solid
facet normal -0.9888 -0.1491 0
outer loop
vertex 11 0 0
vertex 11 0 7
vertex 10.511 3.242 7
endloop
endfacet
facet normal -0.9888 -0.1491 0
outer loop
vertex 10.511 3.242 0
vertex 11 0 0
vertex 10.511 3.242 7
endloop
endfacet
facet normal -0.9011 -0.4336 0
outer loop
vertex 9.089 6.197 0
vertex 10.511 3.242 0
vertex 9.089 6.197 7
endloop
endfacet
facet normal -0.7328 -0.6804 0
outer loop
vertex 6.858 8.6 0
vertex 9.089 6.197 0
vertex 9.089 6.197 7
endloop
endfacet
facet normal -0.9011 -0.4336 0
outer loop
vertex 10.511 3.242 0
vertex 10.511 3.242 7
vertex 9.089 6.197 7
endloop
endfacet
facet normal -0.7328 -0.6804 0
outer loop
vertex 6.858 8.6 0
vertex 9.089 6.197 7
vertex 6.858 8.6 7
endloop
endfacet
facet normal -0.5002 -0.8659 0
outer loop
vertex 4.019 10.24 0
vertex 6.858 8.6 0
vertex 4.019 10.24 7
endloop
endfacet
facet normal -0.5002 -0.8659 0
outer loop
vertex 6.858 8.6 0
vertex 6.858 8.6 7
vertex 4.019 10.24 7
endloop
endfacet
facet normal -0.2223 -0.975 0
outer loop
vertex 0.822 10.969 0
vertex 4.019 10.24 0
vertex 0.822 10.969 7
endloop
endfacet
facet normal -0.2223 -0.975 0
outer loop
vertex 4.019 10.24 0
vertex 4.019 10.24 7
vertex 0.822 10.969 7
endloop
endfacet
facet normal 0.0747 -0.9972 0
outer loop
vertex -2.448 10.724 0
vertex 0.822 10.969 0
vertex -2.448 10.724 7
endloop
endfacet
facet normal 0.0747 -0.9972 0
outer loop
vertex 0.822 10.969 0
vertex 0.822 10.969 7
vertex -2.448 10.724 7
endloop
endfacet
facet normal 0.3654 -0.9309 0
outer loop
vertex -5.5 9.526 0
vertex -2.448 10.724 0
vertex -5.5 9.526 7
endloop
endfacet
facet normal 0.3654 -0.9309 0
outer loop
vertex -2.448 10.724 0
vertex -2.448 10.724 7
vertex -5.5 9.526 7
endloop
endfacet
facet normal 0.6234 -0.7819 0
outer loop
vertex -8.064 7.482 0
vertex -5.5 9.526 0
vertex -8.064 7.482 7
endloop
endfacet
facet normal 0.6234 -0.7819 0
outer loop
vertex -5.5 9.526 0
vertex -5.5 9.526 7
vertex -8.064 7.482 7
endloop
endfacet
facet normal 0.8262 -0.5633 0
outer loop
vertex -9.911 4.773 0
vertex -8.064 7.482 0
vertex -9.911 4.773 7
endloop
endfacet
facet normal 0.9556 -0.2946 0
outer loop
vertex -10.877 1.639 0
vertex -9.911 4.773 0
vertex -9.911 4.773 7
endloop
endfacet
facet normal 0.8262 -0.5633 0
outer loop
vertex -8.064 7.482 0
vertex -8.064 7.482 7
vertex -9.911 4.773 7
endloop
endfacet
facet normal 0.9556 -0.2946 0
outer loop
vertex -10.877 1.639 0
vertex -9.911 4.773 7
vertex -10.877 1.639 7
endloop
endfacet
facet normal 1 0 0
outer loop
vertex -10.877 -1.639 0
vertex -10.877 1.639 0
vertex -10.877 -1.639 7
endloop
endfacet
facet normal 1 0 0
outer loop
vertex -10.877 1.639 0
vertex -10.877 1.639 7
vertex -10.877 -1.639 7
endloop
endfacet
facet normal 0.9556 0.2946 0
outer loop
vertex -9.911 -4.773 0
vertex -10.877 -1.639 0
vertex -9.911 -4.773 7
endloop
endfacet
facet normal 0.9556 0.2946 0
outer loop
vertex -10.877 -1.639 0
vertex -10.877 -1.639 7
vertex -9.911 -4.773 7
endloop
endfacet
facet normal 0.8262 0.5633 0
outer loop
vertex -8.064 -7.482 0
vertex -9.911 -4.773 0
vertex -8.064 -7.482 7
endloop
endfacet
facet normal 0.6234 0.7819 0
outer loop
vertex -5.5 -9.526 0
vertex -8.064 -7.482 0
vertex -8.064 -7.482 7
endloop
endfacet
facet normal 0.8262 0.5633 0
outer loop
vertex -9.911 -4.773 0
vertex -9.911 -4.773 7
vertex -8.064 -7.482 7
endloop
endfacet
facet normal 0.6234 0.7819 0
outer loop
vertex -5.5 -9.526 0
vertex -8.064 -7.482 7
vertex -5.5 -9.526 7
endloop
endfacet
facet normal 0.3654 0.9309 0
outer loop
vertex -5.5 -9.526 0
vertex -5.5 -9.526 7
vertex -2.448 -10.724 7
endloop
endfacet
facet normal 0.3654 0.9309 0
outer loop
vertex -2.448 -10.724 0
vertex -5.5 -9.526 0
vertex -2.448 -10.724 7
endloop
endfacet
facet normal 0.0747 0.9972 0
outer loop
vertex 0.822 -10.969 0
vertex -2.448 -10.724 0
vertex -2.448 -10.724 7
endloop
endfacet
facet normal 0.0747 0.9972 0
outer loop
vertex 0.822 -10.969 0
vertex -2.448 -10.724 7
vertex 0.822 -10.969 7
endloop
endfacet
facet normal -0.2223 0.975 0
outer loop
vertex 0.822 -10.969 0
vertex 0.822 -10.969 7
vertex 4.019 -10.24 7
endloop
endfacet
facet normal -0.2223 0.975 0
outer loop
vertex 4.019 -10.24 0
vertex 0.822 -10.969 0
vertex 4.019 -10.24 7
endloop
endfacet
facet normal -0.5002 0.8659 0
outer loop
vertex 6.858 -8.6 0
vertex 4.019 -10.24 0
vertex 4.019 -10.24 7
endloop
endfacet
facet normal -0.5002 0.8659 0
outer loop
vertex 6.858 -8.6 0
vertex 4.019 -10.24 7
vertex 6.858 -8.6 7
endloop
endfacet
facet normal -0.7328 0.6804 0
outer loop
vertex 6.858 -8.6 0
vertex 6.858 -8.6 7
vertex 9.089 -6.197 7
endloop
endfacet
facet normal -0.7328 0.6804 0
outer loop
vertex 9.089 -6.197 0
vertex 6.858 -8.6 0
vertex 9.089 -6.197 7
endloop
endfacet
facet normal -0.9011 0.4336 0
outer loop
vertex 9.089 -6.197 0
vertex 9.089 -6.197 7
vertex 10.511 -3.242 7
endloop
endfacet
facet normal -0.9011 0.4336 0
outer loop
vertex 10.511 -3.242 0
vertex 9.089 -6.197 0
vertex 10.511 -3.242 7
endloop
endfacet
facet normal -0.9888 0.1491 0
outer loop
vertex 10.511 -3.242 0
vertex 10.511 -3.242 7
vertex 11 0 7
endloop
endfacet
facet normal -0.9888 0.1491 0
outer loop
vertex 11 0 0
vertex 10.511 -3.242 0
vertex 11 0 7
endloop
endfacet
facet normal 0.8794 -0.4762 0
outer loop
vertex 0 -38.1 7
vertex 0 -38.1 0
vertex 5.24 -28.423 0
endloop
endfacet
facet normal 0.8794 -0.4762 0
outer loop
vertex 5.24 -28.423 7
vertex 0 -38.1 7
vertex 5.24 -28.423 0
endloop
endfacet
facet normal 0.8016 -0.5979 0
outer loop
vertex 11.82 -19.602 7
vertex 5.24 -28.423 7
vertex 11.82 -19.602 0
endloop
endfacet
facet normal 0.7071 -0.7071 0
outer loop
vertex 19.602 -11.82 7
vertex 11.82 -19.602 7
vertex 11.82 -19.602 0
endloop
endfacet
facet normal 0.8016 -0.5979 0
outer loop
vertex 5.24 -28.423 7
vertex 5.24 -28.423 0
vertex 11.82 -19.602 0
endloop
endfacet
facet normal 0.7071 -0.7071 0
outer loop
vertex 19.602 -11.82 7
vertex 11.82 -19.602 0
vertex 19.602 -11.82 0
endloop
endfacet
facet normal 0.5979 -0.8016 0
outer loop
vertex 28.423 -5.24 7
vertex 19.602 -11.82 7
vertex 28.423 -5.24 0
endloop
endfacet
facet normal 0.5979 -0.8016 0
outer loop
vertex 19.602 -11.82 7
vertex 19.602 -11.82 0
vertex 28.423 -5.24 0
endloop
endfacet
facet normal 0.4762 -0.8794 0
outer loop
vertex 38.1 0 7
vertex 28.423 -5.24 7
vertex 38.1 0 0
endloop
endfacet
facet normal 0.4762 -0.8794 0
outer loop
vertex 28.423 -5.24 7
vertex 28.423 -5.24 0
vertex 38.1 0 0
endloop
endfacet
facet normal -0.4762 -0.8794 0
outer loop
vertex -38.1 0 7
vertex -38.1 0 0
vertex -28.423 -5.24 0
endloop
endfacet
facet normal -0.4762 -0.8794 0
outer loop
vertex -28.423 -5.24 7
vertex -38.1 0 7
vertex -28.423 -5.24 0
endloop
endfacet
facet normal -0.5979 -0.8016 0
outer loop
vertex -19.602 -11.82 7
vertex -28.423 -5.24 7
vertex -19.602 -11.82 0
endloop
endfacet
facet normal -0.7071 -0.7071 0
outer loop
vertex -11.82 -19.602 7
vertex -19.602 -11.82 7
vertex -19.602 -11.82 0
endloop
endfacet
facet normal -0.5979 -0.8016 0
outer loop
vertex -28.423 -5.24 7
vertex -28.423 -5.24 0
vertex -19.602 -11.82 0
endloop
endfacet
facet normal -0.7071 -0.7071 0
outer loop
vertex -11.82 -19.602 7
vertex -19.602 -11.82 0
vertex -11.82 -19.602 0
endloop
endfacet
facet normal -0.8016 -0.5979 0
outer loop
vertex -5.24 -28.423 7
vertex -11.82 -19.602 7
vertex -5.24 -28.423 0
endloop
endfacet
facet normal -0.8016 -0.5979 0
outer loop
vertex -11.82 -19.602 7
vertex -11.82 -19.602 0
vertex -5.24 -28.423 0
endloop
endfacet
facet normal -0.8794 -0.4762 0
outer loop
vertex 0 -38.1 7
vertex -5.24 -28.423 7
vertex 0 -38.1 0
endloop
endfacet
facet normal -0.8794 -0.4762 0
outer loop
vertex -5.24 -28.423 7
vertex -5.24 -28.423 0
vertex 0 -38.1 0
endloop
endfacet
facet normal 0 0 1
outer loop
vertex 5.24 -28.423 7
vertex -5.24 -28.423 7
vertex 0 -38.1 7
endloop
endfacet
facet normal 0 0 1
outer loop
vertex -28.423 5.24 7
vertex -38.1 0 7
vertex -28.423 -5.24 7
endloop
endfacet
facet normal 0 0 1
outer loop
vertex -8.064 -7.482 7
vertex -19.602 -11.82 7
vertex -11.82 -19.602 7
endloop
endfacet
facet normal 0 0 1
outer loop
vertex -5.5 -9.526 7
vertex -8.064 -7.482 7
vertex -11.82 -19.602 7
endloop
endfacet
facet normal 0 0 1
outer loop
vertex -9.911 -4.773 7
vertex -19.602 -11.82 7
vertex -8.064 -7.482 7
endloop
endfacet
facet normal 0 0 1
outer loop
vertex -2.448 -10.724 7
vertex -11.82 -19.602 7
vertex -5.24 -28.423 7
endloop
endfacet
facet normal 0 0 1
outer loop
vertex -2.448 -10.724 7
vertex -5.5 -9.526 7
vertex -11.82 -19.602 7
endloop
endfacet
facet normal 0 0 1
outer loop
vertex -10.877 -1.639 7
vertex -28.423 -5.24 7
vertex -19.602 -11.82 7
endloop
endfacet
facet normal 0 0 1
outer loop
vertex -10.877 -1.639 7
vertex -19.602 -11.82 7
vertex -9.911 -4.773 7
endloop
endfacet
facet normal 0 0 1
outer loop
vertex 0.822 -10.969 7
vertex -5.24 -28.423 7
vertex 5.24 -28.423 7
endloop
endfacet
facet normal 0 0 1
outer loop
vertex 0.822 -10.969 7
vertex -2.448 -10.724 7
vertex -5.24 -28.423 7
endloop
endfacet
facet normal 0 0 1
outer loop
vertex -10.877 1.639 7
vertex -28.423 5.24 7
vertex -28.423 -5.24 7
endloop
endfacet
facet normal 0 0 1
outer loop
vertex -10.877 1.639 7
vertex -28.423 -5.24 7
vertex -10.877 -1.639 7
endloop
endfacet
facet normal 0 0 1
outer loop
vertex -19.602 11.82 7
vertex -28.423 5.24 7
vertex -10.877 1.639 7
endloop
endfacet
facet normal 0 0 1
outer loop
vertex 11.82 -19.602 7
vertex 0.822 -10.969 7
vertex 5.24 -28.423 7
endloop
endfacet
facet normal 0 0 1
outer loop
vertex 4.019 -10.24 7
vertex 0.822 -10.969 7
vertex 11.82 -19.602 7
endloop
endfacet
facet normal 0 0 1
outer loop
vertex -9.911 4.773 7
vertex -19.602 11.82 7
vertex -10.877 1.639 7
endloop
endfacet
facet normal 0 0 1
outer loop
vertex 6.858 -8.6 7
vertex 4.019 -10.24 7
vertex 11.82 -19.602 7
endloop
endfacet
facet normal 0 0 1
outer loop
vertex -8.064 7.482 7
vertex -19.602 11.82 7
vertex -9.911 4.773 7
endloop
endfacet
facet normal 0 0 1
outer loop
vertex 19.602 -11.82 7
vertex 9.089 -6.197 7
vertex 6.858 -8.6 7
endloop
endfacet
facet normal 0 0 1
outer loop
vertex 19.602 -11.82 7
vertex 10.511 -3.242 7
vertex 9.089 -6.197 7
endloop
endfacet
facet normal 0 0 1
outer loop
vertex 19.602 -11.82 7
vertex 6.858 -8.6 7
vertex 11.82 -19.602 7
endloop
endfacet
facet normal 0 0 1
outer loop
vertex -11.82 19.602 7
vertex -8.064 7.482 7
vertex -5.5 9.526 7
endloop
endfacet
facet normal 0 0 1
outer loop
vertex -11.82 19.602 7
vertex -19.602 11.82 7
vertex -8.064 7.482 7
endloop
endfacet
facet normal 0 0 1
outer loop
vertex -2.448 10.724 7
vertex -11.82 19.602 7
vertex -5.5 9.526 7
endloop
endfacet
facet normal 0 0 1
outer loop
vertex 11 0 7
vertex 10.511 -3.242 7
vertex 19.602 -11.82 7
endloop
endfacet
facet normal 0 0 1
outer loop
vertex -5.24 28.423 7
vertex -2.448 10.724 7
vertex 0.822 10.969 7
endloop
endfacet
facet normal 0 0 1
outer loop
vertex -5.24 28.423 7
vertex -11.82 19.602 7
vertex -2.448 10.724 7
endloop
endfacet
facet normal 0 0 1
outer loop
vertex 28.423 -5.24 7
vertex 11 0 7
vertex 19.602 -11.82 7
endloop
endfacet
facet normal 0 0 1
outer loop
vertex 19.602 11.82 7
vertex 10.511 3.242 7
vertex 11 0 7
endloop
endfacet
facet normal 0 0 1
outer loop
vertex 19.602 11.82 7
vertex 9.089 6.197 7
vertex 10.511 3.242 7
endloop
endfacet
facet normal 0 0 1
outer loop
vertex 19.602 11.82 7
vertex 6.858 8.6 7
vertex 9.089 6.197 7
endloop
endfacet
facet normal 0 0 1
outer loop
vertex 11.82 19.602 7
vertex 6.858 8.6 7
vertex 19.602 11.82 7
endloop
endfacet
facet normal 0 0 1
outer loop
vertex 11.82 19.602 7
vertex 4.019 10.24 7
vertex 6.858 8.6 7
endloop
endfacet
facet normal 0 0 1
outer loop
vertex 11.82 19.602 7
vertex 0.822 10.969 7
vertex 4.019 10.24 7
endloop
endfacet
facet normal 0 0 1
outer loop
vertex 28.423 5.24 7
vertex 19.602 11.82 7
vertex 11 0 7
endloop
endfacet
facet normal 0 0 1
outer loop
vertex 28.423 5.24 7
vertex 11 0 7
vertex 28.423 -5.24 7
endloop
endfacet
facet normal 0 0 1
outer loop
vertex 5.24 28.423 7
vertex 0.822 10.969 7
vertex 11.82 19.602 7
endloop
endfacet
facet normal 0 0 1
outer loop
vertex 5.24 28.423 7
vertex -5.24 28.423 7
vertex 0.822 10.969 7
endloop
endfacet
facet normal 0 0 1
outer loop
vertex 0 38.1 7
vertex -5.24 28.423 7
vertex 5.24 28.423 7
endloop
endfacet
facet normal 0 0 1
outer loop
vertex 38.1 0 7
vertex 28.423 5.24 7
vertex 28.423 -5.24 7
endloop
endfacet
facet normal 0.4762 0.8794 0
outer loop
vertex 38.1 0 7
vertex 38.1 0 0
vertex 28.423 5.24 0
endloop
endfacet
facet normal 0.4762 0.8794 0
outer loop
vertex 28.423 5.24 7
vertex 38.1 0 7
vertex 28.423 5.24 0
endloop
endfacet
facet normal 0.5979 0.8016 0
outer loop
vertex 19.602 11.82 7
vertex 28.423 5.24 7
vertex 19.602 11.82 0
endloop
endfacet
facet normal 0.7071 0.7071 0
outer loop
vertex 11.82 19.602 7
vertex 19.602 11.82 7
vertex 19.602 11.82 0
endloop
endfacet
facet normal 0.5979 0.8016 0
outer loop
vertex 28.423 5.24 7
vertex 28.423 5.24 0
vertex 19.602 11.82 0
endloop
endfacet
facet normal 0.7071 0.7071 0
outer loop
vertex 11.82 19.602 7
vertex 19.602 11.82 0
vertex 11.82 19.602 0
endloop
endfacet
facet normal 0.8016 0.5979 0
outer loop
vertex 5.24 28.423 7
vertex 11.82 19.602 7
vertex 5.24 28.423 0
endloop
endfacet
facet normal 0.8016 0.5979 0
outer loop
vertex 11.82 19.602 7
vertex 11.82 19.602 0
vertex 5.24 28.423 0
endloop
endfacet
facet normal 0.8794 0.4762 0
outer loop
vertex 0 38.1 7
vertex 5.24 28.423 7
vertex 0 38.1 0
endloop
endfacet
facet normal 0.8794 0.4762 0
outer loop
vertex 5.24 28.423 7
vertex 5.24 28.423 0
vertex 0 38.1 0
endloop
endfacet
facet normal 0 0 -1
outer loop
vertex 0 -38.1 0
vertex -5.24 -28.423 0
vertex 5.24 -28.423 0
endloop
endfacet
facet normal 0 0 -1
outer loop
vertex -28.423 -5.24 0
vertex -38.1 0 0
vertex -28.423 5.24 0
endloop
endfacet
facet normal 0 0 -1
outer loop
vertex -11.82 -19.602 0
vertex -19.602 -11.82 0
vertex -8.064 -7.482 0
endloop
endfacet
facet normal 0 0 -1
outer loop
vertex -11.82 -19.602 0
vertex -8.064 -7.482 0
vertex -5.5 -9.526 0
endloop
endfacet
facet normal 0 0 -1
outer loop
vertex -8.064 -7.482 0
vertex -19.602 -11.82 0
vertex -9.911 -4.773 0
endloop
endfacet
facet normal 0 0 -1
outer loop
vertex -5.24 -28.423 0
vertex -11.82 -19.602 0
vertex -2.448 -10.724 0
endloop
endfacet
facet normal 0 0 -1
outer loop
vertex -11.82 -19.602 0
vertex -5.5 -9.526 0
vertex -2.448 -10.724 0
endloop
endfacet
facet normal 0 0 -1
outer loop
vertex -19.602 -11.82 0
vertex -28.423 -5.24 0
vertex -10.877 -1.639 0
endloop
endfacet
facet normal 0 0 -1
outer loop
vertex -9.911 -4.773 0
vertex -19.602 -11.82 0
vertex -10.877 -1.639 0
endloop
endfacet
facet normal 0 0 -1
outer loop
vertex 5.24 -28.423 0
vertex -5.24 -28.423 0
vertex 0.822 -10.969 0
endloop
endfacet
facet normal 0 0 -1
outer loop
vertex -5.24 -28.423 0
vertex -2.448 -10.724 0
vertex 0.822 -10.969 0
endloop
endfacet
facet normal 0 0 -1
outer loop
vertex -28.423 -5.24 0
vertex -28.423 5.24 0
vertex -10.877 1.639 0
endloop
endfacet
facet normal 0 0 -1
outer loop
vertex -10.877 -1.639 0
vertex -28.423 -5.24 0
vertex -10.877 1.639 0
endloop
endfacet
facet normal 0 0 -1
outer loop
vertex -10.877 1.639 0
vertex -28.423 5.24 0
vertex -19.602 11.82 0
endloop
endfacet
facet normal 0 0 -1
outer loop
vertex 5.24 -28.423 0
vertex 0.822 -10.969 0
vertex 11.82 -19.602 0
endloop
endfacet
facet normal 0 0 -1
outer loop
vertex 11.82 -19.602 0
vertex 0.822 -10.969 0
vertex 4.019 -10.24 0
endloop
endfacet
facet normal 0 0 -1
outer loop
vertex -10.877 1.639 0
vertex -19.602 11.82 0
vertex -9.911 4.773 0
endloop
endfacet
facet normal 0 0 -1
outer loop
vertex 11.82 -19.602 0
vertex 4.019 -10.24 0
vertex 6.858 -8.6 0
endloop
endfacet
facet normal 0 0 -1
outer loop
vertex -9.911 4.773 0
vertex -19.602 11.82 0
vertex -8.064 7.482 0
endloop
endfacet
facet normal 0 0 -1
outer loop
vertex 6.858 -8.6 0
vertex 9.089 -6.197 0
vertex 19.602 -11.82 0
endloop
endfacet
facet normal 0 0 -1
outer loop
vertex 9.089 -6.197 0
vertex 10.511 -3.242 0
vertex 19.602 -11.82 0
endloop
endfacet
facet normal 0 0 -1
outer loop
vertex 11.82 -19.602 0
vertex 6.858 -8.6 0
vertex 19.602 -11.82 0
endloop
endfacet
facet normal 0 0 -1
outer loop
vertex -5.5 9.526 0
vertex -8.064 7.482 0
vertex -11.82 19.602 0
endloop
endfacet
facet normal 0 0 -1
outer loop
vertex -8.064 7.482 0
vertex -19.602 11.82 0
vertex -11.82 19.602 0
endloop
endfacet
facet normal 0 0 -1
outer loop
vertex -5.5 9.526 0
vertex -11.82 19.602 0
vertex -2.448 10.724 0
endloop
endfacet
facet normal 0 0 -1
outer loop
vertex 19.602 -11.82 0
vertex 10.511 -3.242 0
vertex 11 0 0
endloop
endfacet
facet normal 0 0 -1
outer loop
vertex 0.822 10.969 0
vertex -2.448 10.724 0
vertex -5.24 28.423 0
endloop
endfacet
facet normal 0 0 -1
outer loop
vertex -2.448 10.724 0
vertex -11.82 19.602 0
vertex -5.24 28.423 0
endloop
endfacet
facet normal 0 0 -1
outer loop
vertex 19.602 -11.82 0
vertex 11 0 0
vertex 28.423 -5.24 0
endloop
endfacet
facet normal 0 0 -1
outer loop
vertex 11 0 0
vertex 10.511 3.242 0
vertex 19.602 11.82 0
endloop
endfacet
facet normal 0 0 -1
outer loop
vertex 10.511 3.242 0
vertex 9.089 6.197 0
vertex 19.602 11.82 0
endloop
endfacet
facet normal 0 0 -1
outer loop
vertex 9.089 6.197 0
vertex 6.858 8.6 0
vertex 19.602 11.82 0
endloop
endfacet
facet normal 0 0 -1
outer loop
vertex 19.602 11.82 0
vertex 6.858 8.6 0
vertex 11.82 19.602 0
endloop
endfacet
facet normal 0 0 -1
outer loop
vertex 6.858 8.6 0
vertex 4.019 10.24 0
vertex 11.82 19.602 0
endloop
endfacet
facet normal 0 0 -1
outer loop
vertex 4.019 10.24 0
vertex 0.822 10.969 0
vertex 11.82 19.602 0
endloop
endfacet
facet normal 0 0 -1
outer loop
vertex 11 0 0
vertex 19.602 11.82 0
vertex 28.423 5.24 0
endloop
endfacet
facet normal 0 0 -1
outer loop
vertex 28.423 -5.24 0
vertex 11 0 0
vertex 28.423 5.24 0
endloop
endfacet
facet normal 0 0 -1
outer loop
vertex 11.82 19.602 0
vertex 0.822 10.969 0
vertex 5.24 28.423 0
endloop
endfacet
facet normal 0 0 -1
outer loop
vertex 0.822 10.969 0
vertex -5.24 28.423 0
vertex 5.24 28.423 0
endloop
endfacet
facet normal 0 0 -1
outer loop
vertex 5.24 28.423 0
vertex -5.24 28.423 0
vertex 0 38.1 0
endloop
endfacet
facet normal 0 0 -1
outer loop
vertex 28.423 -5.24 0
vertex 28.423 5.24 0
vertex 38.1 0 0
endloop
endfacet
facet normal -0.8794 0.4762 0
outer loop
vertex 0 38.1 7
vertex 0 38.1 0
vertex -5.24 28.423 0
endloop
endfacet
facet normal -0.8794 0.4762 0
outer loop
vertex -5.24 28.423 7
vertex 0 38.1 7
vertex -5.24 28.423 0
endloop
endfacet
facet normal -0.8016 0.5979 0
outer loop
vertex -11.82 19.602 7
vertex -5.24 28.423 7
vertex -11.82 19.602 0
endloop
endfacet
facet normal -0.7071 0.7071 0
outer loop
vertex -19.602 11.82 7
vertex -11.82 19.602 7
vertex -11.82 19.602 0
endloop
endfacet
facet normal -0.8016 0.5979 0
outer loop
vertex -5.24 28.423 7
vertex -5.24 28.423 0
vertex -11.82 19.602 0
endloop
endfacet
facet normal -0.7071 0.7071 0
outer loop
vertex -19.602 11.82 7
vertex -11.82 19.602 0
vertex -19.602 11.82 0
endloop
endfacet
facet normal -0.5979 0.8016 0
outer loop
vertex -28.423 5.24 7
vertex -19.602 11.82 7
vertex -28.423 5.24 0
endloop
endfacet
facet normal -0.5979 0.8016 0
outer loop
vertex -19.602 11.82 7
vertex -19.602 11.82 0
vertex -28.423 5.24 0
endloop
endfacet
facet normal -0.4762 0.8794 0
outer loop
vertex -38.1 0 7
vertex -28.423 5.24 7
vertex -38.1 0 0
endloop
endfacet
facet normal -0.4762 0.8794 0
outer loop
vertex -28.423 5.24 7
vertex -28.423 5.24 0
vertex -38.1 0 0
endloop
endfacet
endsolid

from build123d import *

# Parameters (mm, degrees)
F1_DEPTH = 7.000011
F2_R     = 11
F3_DEPTH = 7.001011


with BuildPart() as f1:
    # F0 (on Top) → F1 (new body)
    with BuildSketch(Plane.XY):
        with BuildLine():
            ThreePointArc((0, -38.1), (15.570026, -15.570026), (38.1, 0))
            ThreePointArc((38.1, 0), (15.570026, 15.570026), (0, 38.1))
            ThreePointArc((0, 38.1), (-15.570026, 15.570026), (-38.1, 0))
            ThreePointArc((-38.1, 0), (-15.570026, -15.570026), (0, -38.1))
        make_face()
    extrude(amount=F1_DEPTH)

    # F2 (on face) → F3 (cut, through all)
    with BuildSketch(Plane.XY.offset(7.000011)):
        Circle(F2_R)
    extrude(amount=-F3_DEPTH, mode=Mode.SUBTRACT)


solid = f1.part
